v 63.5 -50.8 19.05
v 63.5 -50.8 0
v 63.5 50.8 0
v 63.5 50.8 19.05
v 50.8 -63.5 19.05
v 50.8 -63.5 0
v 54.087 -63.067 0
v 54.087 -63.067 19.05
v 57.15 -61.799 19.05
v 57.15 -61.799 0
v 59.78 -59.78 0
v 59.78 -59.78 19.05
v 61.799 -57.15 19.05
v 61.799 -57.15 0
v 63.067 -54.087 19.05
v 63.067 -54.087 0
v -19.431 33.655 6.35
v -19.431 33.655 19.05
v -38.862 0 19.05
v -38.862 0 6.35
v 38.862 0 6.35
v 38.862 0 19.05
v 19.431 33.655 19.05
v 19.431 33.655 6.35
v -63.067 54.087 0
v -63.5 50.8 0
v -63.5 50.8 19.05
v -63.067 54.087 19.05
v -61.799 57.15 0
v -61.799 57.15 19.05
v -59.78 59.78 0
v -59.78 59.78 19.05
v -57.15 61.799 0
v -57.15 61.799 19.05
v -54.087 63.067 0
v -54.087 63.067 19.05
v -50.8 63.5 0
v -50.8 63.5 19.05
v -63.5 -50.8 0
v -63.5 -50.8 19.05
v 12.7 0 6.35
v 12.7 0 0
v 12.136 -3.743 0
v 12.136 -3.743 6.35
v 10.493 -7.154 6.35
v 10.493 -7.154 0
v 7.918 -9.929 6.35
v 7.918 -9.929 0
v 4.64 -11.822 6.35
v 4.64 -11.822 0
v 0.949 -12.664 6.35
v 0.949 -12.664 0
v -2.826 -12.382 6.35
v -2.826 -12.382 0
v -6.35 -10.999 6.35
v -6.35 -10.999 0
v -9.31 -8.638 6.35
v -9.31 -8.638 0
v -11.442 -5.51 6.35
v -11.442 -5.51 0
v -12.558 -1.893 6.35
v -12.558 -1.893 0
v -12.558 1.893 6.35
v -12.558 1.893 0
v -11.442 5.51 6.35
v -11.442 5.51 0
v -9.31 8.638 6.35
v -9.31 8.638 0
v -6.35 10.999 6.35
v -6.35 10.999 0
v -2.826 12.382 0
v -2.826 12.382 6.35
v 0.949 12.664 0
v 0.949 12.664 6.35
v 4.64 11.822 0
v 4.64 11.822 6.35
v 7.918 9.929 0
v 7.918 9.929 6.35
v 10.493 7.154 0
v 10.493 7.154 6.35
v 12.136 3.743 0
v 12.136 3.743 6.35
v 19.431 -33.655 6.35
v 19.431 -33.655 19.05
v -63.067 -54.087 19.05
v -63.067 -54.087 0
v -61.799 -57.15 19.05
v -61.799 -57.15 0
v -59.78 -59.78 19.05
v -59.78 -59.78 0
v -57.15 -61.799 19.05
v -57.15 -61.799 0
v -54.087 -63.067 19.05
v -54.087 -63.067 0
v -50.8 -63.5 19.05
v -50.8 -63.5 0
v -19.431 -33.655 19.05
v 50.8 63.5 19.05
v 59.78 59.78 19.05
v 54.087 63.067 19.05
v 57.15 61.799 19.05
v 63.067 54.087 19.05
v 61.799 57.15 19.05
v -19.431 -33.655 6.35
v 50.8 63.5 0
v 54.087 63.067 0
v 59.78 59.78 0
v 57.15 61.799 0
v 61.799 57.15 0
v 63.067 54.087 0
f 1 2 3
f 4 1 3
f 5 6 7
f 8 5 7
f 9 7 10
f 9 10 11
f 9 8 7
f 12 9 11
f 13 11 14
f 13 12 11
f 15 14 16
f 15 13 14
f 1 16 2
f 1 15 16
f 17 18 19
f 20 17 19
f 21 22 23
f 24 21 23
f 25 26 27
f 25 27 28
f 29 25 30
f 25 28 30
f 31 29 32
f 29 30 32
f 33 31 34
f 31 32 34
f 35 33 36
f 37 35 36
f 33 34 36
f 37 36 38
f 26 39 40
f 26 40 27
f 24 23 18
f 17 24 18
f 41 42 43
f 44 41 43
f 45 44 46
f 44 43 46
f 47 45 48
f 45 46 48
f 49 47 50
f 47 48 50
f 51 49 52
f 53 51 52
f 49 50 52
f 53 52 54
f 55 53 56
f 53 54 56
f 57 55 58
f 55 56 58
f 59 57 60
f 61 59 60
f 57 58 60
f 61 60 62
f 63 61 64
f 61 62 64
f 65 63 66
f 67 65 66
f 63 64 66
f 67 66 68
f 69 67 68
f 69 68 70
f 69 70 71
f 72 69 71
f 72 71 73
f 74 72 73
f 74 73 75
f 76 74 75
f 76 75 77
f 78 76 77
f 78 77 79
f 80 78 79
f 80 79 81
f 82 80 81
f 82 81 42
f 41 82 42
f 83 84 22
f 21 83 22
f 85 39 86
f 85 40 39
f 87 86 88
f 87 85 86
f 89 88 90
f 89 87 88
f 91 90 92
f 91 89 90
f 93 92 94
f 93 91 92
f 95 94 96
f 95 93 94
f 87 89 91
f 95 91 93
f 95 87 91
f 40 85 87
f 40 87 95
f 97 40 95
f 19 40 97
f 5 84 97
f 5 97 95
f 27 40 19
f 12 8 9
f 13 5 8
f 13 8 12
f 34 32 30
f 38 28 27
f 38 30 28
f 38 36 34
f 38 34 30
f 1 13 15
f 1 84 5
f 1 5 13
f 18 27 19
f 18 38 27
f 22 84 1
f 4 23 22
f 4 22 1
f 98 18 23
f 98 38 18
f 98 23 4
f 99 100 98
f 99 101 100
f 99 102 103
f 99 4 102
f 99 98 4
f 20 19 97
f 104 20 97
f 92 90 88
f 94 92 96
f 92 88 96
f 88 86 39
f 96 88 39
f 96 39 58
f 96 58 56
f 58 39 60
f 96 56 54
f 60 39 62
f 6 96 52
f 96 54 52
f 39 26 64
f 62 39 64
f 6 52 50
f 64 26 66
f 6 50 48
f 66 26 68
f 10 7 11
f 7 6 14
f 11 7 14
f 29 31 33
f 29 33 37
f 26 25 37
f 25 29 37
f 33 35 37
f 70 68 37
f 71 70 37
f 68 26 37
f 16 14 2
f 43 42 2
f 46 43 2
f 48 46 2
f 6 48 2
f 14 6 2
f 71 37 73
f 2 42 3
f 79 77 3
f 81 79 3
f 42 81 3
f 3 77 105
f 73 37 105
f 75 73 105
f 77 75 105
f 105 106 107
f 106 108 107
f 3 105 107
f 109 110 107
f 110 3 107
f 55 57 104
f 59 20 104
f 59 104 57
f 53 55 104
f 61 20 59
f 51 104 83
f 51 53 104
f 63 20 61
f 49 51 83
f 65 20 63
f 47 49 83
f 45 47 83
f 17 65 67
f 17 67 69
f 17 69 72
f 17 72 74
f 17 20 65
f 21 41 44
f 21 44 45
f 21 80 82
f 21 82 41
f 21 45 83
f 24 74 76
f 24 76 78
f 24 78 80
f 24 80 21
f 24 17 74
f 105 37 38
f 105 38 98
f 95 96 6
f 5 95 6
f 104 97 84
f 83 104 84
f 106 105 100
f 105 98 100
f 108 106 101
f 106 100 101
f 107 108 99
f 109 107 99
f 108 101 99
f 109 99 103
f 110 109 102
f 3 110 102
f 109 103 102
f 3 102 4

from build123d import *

# Parameters (mm, degrees)
F0_W     = 127
F0_H     = 127
F1_DEPTH = 19.05
F3_DEPTH = 12.7
F4_R     = 12.7
F5_R     = 12.7
F6_DEPTH = 25.4


with BuildPart() as f1:
    # F0 (on Top) → F1 (new body)
    with BuildSketch(Plane.XY):
        Rectangle(F0_W, F0_H)
    extrude(amount=F1_DEPTH)

    # F2 (on face) → F3 (cut)
    with BuildSketch(Plane.XY.offset(19.05)):
        Polygon((19.431, -33.655479), (38.862, 0), (19.431, 33.655479), (-19.431, 33.655479), (-38.862, 0), (-19.431, -33.655479), align=None)
    extrude(amount=-F3_DEPTH, mode=Mode.SUBTRACT)

    # F4
    f4_edges = [f1.edges().sort_by_distance(p)[0] for p in [
        (-63.5, -63.5, 9.525),
        (63.5, -63.5, 9.525),
        (63.5, 63.5, 9.525),
        (-63.5, 63.5, 9.525),
    ]]
    fillet(f4_edges, radius=F4_R)

    # F5 (on face) → F6 (cut)
    with BuildSketch(Plane(origin=(0, 0, 0), x_dir=(1, 0, 0), z_dir=(0, 0, -1))):
        Circle(F5_R)
    extrude(amount=-F6_DEPTH, mode=Mode.SUBTRACT)


solid = f1.part
